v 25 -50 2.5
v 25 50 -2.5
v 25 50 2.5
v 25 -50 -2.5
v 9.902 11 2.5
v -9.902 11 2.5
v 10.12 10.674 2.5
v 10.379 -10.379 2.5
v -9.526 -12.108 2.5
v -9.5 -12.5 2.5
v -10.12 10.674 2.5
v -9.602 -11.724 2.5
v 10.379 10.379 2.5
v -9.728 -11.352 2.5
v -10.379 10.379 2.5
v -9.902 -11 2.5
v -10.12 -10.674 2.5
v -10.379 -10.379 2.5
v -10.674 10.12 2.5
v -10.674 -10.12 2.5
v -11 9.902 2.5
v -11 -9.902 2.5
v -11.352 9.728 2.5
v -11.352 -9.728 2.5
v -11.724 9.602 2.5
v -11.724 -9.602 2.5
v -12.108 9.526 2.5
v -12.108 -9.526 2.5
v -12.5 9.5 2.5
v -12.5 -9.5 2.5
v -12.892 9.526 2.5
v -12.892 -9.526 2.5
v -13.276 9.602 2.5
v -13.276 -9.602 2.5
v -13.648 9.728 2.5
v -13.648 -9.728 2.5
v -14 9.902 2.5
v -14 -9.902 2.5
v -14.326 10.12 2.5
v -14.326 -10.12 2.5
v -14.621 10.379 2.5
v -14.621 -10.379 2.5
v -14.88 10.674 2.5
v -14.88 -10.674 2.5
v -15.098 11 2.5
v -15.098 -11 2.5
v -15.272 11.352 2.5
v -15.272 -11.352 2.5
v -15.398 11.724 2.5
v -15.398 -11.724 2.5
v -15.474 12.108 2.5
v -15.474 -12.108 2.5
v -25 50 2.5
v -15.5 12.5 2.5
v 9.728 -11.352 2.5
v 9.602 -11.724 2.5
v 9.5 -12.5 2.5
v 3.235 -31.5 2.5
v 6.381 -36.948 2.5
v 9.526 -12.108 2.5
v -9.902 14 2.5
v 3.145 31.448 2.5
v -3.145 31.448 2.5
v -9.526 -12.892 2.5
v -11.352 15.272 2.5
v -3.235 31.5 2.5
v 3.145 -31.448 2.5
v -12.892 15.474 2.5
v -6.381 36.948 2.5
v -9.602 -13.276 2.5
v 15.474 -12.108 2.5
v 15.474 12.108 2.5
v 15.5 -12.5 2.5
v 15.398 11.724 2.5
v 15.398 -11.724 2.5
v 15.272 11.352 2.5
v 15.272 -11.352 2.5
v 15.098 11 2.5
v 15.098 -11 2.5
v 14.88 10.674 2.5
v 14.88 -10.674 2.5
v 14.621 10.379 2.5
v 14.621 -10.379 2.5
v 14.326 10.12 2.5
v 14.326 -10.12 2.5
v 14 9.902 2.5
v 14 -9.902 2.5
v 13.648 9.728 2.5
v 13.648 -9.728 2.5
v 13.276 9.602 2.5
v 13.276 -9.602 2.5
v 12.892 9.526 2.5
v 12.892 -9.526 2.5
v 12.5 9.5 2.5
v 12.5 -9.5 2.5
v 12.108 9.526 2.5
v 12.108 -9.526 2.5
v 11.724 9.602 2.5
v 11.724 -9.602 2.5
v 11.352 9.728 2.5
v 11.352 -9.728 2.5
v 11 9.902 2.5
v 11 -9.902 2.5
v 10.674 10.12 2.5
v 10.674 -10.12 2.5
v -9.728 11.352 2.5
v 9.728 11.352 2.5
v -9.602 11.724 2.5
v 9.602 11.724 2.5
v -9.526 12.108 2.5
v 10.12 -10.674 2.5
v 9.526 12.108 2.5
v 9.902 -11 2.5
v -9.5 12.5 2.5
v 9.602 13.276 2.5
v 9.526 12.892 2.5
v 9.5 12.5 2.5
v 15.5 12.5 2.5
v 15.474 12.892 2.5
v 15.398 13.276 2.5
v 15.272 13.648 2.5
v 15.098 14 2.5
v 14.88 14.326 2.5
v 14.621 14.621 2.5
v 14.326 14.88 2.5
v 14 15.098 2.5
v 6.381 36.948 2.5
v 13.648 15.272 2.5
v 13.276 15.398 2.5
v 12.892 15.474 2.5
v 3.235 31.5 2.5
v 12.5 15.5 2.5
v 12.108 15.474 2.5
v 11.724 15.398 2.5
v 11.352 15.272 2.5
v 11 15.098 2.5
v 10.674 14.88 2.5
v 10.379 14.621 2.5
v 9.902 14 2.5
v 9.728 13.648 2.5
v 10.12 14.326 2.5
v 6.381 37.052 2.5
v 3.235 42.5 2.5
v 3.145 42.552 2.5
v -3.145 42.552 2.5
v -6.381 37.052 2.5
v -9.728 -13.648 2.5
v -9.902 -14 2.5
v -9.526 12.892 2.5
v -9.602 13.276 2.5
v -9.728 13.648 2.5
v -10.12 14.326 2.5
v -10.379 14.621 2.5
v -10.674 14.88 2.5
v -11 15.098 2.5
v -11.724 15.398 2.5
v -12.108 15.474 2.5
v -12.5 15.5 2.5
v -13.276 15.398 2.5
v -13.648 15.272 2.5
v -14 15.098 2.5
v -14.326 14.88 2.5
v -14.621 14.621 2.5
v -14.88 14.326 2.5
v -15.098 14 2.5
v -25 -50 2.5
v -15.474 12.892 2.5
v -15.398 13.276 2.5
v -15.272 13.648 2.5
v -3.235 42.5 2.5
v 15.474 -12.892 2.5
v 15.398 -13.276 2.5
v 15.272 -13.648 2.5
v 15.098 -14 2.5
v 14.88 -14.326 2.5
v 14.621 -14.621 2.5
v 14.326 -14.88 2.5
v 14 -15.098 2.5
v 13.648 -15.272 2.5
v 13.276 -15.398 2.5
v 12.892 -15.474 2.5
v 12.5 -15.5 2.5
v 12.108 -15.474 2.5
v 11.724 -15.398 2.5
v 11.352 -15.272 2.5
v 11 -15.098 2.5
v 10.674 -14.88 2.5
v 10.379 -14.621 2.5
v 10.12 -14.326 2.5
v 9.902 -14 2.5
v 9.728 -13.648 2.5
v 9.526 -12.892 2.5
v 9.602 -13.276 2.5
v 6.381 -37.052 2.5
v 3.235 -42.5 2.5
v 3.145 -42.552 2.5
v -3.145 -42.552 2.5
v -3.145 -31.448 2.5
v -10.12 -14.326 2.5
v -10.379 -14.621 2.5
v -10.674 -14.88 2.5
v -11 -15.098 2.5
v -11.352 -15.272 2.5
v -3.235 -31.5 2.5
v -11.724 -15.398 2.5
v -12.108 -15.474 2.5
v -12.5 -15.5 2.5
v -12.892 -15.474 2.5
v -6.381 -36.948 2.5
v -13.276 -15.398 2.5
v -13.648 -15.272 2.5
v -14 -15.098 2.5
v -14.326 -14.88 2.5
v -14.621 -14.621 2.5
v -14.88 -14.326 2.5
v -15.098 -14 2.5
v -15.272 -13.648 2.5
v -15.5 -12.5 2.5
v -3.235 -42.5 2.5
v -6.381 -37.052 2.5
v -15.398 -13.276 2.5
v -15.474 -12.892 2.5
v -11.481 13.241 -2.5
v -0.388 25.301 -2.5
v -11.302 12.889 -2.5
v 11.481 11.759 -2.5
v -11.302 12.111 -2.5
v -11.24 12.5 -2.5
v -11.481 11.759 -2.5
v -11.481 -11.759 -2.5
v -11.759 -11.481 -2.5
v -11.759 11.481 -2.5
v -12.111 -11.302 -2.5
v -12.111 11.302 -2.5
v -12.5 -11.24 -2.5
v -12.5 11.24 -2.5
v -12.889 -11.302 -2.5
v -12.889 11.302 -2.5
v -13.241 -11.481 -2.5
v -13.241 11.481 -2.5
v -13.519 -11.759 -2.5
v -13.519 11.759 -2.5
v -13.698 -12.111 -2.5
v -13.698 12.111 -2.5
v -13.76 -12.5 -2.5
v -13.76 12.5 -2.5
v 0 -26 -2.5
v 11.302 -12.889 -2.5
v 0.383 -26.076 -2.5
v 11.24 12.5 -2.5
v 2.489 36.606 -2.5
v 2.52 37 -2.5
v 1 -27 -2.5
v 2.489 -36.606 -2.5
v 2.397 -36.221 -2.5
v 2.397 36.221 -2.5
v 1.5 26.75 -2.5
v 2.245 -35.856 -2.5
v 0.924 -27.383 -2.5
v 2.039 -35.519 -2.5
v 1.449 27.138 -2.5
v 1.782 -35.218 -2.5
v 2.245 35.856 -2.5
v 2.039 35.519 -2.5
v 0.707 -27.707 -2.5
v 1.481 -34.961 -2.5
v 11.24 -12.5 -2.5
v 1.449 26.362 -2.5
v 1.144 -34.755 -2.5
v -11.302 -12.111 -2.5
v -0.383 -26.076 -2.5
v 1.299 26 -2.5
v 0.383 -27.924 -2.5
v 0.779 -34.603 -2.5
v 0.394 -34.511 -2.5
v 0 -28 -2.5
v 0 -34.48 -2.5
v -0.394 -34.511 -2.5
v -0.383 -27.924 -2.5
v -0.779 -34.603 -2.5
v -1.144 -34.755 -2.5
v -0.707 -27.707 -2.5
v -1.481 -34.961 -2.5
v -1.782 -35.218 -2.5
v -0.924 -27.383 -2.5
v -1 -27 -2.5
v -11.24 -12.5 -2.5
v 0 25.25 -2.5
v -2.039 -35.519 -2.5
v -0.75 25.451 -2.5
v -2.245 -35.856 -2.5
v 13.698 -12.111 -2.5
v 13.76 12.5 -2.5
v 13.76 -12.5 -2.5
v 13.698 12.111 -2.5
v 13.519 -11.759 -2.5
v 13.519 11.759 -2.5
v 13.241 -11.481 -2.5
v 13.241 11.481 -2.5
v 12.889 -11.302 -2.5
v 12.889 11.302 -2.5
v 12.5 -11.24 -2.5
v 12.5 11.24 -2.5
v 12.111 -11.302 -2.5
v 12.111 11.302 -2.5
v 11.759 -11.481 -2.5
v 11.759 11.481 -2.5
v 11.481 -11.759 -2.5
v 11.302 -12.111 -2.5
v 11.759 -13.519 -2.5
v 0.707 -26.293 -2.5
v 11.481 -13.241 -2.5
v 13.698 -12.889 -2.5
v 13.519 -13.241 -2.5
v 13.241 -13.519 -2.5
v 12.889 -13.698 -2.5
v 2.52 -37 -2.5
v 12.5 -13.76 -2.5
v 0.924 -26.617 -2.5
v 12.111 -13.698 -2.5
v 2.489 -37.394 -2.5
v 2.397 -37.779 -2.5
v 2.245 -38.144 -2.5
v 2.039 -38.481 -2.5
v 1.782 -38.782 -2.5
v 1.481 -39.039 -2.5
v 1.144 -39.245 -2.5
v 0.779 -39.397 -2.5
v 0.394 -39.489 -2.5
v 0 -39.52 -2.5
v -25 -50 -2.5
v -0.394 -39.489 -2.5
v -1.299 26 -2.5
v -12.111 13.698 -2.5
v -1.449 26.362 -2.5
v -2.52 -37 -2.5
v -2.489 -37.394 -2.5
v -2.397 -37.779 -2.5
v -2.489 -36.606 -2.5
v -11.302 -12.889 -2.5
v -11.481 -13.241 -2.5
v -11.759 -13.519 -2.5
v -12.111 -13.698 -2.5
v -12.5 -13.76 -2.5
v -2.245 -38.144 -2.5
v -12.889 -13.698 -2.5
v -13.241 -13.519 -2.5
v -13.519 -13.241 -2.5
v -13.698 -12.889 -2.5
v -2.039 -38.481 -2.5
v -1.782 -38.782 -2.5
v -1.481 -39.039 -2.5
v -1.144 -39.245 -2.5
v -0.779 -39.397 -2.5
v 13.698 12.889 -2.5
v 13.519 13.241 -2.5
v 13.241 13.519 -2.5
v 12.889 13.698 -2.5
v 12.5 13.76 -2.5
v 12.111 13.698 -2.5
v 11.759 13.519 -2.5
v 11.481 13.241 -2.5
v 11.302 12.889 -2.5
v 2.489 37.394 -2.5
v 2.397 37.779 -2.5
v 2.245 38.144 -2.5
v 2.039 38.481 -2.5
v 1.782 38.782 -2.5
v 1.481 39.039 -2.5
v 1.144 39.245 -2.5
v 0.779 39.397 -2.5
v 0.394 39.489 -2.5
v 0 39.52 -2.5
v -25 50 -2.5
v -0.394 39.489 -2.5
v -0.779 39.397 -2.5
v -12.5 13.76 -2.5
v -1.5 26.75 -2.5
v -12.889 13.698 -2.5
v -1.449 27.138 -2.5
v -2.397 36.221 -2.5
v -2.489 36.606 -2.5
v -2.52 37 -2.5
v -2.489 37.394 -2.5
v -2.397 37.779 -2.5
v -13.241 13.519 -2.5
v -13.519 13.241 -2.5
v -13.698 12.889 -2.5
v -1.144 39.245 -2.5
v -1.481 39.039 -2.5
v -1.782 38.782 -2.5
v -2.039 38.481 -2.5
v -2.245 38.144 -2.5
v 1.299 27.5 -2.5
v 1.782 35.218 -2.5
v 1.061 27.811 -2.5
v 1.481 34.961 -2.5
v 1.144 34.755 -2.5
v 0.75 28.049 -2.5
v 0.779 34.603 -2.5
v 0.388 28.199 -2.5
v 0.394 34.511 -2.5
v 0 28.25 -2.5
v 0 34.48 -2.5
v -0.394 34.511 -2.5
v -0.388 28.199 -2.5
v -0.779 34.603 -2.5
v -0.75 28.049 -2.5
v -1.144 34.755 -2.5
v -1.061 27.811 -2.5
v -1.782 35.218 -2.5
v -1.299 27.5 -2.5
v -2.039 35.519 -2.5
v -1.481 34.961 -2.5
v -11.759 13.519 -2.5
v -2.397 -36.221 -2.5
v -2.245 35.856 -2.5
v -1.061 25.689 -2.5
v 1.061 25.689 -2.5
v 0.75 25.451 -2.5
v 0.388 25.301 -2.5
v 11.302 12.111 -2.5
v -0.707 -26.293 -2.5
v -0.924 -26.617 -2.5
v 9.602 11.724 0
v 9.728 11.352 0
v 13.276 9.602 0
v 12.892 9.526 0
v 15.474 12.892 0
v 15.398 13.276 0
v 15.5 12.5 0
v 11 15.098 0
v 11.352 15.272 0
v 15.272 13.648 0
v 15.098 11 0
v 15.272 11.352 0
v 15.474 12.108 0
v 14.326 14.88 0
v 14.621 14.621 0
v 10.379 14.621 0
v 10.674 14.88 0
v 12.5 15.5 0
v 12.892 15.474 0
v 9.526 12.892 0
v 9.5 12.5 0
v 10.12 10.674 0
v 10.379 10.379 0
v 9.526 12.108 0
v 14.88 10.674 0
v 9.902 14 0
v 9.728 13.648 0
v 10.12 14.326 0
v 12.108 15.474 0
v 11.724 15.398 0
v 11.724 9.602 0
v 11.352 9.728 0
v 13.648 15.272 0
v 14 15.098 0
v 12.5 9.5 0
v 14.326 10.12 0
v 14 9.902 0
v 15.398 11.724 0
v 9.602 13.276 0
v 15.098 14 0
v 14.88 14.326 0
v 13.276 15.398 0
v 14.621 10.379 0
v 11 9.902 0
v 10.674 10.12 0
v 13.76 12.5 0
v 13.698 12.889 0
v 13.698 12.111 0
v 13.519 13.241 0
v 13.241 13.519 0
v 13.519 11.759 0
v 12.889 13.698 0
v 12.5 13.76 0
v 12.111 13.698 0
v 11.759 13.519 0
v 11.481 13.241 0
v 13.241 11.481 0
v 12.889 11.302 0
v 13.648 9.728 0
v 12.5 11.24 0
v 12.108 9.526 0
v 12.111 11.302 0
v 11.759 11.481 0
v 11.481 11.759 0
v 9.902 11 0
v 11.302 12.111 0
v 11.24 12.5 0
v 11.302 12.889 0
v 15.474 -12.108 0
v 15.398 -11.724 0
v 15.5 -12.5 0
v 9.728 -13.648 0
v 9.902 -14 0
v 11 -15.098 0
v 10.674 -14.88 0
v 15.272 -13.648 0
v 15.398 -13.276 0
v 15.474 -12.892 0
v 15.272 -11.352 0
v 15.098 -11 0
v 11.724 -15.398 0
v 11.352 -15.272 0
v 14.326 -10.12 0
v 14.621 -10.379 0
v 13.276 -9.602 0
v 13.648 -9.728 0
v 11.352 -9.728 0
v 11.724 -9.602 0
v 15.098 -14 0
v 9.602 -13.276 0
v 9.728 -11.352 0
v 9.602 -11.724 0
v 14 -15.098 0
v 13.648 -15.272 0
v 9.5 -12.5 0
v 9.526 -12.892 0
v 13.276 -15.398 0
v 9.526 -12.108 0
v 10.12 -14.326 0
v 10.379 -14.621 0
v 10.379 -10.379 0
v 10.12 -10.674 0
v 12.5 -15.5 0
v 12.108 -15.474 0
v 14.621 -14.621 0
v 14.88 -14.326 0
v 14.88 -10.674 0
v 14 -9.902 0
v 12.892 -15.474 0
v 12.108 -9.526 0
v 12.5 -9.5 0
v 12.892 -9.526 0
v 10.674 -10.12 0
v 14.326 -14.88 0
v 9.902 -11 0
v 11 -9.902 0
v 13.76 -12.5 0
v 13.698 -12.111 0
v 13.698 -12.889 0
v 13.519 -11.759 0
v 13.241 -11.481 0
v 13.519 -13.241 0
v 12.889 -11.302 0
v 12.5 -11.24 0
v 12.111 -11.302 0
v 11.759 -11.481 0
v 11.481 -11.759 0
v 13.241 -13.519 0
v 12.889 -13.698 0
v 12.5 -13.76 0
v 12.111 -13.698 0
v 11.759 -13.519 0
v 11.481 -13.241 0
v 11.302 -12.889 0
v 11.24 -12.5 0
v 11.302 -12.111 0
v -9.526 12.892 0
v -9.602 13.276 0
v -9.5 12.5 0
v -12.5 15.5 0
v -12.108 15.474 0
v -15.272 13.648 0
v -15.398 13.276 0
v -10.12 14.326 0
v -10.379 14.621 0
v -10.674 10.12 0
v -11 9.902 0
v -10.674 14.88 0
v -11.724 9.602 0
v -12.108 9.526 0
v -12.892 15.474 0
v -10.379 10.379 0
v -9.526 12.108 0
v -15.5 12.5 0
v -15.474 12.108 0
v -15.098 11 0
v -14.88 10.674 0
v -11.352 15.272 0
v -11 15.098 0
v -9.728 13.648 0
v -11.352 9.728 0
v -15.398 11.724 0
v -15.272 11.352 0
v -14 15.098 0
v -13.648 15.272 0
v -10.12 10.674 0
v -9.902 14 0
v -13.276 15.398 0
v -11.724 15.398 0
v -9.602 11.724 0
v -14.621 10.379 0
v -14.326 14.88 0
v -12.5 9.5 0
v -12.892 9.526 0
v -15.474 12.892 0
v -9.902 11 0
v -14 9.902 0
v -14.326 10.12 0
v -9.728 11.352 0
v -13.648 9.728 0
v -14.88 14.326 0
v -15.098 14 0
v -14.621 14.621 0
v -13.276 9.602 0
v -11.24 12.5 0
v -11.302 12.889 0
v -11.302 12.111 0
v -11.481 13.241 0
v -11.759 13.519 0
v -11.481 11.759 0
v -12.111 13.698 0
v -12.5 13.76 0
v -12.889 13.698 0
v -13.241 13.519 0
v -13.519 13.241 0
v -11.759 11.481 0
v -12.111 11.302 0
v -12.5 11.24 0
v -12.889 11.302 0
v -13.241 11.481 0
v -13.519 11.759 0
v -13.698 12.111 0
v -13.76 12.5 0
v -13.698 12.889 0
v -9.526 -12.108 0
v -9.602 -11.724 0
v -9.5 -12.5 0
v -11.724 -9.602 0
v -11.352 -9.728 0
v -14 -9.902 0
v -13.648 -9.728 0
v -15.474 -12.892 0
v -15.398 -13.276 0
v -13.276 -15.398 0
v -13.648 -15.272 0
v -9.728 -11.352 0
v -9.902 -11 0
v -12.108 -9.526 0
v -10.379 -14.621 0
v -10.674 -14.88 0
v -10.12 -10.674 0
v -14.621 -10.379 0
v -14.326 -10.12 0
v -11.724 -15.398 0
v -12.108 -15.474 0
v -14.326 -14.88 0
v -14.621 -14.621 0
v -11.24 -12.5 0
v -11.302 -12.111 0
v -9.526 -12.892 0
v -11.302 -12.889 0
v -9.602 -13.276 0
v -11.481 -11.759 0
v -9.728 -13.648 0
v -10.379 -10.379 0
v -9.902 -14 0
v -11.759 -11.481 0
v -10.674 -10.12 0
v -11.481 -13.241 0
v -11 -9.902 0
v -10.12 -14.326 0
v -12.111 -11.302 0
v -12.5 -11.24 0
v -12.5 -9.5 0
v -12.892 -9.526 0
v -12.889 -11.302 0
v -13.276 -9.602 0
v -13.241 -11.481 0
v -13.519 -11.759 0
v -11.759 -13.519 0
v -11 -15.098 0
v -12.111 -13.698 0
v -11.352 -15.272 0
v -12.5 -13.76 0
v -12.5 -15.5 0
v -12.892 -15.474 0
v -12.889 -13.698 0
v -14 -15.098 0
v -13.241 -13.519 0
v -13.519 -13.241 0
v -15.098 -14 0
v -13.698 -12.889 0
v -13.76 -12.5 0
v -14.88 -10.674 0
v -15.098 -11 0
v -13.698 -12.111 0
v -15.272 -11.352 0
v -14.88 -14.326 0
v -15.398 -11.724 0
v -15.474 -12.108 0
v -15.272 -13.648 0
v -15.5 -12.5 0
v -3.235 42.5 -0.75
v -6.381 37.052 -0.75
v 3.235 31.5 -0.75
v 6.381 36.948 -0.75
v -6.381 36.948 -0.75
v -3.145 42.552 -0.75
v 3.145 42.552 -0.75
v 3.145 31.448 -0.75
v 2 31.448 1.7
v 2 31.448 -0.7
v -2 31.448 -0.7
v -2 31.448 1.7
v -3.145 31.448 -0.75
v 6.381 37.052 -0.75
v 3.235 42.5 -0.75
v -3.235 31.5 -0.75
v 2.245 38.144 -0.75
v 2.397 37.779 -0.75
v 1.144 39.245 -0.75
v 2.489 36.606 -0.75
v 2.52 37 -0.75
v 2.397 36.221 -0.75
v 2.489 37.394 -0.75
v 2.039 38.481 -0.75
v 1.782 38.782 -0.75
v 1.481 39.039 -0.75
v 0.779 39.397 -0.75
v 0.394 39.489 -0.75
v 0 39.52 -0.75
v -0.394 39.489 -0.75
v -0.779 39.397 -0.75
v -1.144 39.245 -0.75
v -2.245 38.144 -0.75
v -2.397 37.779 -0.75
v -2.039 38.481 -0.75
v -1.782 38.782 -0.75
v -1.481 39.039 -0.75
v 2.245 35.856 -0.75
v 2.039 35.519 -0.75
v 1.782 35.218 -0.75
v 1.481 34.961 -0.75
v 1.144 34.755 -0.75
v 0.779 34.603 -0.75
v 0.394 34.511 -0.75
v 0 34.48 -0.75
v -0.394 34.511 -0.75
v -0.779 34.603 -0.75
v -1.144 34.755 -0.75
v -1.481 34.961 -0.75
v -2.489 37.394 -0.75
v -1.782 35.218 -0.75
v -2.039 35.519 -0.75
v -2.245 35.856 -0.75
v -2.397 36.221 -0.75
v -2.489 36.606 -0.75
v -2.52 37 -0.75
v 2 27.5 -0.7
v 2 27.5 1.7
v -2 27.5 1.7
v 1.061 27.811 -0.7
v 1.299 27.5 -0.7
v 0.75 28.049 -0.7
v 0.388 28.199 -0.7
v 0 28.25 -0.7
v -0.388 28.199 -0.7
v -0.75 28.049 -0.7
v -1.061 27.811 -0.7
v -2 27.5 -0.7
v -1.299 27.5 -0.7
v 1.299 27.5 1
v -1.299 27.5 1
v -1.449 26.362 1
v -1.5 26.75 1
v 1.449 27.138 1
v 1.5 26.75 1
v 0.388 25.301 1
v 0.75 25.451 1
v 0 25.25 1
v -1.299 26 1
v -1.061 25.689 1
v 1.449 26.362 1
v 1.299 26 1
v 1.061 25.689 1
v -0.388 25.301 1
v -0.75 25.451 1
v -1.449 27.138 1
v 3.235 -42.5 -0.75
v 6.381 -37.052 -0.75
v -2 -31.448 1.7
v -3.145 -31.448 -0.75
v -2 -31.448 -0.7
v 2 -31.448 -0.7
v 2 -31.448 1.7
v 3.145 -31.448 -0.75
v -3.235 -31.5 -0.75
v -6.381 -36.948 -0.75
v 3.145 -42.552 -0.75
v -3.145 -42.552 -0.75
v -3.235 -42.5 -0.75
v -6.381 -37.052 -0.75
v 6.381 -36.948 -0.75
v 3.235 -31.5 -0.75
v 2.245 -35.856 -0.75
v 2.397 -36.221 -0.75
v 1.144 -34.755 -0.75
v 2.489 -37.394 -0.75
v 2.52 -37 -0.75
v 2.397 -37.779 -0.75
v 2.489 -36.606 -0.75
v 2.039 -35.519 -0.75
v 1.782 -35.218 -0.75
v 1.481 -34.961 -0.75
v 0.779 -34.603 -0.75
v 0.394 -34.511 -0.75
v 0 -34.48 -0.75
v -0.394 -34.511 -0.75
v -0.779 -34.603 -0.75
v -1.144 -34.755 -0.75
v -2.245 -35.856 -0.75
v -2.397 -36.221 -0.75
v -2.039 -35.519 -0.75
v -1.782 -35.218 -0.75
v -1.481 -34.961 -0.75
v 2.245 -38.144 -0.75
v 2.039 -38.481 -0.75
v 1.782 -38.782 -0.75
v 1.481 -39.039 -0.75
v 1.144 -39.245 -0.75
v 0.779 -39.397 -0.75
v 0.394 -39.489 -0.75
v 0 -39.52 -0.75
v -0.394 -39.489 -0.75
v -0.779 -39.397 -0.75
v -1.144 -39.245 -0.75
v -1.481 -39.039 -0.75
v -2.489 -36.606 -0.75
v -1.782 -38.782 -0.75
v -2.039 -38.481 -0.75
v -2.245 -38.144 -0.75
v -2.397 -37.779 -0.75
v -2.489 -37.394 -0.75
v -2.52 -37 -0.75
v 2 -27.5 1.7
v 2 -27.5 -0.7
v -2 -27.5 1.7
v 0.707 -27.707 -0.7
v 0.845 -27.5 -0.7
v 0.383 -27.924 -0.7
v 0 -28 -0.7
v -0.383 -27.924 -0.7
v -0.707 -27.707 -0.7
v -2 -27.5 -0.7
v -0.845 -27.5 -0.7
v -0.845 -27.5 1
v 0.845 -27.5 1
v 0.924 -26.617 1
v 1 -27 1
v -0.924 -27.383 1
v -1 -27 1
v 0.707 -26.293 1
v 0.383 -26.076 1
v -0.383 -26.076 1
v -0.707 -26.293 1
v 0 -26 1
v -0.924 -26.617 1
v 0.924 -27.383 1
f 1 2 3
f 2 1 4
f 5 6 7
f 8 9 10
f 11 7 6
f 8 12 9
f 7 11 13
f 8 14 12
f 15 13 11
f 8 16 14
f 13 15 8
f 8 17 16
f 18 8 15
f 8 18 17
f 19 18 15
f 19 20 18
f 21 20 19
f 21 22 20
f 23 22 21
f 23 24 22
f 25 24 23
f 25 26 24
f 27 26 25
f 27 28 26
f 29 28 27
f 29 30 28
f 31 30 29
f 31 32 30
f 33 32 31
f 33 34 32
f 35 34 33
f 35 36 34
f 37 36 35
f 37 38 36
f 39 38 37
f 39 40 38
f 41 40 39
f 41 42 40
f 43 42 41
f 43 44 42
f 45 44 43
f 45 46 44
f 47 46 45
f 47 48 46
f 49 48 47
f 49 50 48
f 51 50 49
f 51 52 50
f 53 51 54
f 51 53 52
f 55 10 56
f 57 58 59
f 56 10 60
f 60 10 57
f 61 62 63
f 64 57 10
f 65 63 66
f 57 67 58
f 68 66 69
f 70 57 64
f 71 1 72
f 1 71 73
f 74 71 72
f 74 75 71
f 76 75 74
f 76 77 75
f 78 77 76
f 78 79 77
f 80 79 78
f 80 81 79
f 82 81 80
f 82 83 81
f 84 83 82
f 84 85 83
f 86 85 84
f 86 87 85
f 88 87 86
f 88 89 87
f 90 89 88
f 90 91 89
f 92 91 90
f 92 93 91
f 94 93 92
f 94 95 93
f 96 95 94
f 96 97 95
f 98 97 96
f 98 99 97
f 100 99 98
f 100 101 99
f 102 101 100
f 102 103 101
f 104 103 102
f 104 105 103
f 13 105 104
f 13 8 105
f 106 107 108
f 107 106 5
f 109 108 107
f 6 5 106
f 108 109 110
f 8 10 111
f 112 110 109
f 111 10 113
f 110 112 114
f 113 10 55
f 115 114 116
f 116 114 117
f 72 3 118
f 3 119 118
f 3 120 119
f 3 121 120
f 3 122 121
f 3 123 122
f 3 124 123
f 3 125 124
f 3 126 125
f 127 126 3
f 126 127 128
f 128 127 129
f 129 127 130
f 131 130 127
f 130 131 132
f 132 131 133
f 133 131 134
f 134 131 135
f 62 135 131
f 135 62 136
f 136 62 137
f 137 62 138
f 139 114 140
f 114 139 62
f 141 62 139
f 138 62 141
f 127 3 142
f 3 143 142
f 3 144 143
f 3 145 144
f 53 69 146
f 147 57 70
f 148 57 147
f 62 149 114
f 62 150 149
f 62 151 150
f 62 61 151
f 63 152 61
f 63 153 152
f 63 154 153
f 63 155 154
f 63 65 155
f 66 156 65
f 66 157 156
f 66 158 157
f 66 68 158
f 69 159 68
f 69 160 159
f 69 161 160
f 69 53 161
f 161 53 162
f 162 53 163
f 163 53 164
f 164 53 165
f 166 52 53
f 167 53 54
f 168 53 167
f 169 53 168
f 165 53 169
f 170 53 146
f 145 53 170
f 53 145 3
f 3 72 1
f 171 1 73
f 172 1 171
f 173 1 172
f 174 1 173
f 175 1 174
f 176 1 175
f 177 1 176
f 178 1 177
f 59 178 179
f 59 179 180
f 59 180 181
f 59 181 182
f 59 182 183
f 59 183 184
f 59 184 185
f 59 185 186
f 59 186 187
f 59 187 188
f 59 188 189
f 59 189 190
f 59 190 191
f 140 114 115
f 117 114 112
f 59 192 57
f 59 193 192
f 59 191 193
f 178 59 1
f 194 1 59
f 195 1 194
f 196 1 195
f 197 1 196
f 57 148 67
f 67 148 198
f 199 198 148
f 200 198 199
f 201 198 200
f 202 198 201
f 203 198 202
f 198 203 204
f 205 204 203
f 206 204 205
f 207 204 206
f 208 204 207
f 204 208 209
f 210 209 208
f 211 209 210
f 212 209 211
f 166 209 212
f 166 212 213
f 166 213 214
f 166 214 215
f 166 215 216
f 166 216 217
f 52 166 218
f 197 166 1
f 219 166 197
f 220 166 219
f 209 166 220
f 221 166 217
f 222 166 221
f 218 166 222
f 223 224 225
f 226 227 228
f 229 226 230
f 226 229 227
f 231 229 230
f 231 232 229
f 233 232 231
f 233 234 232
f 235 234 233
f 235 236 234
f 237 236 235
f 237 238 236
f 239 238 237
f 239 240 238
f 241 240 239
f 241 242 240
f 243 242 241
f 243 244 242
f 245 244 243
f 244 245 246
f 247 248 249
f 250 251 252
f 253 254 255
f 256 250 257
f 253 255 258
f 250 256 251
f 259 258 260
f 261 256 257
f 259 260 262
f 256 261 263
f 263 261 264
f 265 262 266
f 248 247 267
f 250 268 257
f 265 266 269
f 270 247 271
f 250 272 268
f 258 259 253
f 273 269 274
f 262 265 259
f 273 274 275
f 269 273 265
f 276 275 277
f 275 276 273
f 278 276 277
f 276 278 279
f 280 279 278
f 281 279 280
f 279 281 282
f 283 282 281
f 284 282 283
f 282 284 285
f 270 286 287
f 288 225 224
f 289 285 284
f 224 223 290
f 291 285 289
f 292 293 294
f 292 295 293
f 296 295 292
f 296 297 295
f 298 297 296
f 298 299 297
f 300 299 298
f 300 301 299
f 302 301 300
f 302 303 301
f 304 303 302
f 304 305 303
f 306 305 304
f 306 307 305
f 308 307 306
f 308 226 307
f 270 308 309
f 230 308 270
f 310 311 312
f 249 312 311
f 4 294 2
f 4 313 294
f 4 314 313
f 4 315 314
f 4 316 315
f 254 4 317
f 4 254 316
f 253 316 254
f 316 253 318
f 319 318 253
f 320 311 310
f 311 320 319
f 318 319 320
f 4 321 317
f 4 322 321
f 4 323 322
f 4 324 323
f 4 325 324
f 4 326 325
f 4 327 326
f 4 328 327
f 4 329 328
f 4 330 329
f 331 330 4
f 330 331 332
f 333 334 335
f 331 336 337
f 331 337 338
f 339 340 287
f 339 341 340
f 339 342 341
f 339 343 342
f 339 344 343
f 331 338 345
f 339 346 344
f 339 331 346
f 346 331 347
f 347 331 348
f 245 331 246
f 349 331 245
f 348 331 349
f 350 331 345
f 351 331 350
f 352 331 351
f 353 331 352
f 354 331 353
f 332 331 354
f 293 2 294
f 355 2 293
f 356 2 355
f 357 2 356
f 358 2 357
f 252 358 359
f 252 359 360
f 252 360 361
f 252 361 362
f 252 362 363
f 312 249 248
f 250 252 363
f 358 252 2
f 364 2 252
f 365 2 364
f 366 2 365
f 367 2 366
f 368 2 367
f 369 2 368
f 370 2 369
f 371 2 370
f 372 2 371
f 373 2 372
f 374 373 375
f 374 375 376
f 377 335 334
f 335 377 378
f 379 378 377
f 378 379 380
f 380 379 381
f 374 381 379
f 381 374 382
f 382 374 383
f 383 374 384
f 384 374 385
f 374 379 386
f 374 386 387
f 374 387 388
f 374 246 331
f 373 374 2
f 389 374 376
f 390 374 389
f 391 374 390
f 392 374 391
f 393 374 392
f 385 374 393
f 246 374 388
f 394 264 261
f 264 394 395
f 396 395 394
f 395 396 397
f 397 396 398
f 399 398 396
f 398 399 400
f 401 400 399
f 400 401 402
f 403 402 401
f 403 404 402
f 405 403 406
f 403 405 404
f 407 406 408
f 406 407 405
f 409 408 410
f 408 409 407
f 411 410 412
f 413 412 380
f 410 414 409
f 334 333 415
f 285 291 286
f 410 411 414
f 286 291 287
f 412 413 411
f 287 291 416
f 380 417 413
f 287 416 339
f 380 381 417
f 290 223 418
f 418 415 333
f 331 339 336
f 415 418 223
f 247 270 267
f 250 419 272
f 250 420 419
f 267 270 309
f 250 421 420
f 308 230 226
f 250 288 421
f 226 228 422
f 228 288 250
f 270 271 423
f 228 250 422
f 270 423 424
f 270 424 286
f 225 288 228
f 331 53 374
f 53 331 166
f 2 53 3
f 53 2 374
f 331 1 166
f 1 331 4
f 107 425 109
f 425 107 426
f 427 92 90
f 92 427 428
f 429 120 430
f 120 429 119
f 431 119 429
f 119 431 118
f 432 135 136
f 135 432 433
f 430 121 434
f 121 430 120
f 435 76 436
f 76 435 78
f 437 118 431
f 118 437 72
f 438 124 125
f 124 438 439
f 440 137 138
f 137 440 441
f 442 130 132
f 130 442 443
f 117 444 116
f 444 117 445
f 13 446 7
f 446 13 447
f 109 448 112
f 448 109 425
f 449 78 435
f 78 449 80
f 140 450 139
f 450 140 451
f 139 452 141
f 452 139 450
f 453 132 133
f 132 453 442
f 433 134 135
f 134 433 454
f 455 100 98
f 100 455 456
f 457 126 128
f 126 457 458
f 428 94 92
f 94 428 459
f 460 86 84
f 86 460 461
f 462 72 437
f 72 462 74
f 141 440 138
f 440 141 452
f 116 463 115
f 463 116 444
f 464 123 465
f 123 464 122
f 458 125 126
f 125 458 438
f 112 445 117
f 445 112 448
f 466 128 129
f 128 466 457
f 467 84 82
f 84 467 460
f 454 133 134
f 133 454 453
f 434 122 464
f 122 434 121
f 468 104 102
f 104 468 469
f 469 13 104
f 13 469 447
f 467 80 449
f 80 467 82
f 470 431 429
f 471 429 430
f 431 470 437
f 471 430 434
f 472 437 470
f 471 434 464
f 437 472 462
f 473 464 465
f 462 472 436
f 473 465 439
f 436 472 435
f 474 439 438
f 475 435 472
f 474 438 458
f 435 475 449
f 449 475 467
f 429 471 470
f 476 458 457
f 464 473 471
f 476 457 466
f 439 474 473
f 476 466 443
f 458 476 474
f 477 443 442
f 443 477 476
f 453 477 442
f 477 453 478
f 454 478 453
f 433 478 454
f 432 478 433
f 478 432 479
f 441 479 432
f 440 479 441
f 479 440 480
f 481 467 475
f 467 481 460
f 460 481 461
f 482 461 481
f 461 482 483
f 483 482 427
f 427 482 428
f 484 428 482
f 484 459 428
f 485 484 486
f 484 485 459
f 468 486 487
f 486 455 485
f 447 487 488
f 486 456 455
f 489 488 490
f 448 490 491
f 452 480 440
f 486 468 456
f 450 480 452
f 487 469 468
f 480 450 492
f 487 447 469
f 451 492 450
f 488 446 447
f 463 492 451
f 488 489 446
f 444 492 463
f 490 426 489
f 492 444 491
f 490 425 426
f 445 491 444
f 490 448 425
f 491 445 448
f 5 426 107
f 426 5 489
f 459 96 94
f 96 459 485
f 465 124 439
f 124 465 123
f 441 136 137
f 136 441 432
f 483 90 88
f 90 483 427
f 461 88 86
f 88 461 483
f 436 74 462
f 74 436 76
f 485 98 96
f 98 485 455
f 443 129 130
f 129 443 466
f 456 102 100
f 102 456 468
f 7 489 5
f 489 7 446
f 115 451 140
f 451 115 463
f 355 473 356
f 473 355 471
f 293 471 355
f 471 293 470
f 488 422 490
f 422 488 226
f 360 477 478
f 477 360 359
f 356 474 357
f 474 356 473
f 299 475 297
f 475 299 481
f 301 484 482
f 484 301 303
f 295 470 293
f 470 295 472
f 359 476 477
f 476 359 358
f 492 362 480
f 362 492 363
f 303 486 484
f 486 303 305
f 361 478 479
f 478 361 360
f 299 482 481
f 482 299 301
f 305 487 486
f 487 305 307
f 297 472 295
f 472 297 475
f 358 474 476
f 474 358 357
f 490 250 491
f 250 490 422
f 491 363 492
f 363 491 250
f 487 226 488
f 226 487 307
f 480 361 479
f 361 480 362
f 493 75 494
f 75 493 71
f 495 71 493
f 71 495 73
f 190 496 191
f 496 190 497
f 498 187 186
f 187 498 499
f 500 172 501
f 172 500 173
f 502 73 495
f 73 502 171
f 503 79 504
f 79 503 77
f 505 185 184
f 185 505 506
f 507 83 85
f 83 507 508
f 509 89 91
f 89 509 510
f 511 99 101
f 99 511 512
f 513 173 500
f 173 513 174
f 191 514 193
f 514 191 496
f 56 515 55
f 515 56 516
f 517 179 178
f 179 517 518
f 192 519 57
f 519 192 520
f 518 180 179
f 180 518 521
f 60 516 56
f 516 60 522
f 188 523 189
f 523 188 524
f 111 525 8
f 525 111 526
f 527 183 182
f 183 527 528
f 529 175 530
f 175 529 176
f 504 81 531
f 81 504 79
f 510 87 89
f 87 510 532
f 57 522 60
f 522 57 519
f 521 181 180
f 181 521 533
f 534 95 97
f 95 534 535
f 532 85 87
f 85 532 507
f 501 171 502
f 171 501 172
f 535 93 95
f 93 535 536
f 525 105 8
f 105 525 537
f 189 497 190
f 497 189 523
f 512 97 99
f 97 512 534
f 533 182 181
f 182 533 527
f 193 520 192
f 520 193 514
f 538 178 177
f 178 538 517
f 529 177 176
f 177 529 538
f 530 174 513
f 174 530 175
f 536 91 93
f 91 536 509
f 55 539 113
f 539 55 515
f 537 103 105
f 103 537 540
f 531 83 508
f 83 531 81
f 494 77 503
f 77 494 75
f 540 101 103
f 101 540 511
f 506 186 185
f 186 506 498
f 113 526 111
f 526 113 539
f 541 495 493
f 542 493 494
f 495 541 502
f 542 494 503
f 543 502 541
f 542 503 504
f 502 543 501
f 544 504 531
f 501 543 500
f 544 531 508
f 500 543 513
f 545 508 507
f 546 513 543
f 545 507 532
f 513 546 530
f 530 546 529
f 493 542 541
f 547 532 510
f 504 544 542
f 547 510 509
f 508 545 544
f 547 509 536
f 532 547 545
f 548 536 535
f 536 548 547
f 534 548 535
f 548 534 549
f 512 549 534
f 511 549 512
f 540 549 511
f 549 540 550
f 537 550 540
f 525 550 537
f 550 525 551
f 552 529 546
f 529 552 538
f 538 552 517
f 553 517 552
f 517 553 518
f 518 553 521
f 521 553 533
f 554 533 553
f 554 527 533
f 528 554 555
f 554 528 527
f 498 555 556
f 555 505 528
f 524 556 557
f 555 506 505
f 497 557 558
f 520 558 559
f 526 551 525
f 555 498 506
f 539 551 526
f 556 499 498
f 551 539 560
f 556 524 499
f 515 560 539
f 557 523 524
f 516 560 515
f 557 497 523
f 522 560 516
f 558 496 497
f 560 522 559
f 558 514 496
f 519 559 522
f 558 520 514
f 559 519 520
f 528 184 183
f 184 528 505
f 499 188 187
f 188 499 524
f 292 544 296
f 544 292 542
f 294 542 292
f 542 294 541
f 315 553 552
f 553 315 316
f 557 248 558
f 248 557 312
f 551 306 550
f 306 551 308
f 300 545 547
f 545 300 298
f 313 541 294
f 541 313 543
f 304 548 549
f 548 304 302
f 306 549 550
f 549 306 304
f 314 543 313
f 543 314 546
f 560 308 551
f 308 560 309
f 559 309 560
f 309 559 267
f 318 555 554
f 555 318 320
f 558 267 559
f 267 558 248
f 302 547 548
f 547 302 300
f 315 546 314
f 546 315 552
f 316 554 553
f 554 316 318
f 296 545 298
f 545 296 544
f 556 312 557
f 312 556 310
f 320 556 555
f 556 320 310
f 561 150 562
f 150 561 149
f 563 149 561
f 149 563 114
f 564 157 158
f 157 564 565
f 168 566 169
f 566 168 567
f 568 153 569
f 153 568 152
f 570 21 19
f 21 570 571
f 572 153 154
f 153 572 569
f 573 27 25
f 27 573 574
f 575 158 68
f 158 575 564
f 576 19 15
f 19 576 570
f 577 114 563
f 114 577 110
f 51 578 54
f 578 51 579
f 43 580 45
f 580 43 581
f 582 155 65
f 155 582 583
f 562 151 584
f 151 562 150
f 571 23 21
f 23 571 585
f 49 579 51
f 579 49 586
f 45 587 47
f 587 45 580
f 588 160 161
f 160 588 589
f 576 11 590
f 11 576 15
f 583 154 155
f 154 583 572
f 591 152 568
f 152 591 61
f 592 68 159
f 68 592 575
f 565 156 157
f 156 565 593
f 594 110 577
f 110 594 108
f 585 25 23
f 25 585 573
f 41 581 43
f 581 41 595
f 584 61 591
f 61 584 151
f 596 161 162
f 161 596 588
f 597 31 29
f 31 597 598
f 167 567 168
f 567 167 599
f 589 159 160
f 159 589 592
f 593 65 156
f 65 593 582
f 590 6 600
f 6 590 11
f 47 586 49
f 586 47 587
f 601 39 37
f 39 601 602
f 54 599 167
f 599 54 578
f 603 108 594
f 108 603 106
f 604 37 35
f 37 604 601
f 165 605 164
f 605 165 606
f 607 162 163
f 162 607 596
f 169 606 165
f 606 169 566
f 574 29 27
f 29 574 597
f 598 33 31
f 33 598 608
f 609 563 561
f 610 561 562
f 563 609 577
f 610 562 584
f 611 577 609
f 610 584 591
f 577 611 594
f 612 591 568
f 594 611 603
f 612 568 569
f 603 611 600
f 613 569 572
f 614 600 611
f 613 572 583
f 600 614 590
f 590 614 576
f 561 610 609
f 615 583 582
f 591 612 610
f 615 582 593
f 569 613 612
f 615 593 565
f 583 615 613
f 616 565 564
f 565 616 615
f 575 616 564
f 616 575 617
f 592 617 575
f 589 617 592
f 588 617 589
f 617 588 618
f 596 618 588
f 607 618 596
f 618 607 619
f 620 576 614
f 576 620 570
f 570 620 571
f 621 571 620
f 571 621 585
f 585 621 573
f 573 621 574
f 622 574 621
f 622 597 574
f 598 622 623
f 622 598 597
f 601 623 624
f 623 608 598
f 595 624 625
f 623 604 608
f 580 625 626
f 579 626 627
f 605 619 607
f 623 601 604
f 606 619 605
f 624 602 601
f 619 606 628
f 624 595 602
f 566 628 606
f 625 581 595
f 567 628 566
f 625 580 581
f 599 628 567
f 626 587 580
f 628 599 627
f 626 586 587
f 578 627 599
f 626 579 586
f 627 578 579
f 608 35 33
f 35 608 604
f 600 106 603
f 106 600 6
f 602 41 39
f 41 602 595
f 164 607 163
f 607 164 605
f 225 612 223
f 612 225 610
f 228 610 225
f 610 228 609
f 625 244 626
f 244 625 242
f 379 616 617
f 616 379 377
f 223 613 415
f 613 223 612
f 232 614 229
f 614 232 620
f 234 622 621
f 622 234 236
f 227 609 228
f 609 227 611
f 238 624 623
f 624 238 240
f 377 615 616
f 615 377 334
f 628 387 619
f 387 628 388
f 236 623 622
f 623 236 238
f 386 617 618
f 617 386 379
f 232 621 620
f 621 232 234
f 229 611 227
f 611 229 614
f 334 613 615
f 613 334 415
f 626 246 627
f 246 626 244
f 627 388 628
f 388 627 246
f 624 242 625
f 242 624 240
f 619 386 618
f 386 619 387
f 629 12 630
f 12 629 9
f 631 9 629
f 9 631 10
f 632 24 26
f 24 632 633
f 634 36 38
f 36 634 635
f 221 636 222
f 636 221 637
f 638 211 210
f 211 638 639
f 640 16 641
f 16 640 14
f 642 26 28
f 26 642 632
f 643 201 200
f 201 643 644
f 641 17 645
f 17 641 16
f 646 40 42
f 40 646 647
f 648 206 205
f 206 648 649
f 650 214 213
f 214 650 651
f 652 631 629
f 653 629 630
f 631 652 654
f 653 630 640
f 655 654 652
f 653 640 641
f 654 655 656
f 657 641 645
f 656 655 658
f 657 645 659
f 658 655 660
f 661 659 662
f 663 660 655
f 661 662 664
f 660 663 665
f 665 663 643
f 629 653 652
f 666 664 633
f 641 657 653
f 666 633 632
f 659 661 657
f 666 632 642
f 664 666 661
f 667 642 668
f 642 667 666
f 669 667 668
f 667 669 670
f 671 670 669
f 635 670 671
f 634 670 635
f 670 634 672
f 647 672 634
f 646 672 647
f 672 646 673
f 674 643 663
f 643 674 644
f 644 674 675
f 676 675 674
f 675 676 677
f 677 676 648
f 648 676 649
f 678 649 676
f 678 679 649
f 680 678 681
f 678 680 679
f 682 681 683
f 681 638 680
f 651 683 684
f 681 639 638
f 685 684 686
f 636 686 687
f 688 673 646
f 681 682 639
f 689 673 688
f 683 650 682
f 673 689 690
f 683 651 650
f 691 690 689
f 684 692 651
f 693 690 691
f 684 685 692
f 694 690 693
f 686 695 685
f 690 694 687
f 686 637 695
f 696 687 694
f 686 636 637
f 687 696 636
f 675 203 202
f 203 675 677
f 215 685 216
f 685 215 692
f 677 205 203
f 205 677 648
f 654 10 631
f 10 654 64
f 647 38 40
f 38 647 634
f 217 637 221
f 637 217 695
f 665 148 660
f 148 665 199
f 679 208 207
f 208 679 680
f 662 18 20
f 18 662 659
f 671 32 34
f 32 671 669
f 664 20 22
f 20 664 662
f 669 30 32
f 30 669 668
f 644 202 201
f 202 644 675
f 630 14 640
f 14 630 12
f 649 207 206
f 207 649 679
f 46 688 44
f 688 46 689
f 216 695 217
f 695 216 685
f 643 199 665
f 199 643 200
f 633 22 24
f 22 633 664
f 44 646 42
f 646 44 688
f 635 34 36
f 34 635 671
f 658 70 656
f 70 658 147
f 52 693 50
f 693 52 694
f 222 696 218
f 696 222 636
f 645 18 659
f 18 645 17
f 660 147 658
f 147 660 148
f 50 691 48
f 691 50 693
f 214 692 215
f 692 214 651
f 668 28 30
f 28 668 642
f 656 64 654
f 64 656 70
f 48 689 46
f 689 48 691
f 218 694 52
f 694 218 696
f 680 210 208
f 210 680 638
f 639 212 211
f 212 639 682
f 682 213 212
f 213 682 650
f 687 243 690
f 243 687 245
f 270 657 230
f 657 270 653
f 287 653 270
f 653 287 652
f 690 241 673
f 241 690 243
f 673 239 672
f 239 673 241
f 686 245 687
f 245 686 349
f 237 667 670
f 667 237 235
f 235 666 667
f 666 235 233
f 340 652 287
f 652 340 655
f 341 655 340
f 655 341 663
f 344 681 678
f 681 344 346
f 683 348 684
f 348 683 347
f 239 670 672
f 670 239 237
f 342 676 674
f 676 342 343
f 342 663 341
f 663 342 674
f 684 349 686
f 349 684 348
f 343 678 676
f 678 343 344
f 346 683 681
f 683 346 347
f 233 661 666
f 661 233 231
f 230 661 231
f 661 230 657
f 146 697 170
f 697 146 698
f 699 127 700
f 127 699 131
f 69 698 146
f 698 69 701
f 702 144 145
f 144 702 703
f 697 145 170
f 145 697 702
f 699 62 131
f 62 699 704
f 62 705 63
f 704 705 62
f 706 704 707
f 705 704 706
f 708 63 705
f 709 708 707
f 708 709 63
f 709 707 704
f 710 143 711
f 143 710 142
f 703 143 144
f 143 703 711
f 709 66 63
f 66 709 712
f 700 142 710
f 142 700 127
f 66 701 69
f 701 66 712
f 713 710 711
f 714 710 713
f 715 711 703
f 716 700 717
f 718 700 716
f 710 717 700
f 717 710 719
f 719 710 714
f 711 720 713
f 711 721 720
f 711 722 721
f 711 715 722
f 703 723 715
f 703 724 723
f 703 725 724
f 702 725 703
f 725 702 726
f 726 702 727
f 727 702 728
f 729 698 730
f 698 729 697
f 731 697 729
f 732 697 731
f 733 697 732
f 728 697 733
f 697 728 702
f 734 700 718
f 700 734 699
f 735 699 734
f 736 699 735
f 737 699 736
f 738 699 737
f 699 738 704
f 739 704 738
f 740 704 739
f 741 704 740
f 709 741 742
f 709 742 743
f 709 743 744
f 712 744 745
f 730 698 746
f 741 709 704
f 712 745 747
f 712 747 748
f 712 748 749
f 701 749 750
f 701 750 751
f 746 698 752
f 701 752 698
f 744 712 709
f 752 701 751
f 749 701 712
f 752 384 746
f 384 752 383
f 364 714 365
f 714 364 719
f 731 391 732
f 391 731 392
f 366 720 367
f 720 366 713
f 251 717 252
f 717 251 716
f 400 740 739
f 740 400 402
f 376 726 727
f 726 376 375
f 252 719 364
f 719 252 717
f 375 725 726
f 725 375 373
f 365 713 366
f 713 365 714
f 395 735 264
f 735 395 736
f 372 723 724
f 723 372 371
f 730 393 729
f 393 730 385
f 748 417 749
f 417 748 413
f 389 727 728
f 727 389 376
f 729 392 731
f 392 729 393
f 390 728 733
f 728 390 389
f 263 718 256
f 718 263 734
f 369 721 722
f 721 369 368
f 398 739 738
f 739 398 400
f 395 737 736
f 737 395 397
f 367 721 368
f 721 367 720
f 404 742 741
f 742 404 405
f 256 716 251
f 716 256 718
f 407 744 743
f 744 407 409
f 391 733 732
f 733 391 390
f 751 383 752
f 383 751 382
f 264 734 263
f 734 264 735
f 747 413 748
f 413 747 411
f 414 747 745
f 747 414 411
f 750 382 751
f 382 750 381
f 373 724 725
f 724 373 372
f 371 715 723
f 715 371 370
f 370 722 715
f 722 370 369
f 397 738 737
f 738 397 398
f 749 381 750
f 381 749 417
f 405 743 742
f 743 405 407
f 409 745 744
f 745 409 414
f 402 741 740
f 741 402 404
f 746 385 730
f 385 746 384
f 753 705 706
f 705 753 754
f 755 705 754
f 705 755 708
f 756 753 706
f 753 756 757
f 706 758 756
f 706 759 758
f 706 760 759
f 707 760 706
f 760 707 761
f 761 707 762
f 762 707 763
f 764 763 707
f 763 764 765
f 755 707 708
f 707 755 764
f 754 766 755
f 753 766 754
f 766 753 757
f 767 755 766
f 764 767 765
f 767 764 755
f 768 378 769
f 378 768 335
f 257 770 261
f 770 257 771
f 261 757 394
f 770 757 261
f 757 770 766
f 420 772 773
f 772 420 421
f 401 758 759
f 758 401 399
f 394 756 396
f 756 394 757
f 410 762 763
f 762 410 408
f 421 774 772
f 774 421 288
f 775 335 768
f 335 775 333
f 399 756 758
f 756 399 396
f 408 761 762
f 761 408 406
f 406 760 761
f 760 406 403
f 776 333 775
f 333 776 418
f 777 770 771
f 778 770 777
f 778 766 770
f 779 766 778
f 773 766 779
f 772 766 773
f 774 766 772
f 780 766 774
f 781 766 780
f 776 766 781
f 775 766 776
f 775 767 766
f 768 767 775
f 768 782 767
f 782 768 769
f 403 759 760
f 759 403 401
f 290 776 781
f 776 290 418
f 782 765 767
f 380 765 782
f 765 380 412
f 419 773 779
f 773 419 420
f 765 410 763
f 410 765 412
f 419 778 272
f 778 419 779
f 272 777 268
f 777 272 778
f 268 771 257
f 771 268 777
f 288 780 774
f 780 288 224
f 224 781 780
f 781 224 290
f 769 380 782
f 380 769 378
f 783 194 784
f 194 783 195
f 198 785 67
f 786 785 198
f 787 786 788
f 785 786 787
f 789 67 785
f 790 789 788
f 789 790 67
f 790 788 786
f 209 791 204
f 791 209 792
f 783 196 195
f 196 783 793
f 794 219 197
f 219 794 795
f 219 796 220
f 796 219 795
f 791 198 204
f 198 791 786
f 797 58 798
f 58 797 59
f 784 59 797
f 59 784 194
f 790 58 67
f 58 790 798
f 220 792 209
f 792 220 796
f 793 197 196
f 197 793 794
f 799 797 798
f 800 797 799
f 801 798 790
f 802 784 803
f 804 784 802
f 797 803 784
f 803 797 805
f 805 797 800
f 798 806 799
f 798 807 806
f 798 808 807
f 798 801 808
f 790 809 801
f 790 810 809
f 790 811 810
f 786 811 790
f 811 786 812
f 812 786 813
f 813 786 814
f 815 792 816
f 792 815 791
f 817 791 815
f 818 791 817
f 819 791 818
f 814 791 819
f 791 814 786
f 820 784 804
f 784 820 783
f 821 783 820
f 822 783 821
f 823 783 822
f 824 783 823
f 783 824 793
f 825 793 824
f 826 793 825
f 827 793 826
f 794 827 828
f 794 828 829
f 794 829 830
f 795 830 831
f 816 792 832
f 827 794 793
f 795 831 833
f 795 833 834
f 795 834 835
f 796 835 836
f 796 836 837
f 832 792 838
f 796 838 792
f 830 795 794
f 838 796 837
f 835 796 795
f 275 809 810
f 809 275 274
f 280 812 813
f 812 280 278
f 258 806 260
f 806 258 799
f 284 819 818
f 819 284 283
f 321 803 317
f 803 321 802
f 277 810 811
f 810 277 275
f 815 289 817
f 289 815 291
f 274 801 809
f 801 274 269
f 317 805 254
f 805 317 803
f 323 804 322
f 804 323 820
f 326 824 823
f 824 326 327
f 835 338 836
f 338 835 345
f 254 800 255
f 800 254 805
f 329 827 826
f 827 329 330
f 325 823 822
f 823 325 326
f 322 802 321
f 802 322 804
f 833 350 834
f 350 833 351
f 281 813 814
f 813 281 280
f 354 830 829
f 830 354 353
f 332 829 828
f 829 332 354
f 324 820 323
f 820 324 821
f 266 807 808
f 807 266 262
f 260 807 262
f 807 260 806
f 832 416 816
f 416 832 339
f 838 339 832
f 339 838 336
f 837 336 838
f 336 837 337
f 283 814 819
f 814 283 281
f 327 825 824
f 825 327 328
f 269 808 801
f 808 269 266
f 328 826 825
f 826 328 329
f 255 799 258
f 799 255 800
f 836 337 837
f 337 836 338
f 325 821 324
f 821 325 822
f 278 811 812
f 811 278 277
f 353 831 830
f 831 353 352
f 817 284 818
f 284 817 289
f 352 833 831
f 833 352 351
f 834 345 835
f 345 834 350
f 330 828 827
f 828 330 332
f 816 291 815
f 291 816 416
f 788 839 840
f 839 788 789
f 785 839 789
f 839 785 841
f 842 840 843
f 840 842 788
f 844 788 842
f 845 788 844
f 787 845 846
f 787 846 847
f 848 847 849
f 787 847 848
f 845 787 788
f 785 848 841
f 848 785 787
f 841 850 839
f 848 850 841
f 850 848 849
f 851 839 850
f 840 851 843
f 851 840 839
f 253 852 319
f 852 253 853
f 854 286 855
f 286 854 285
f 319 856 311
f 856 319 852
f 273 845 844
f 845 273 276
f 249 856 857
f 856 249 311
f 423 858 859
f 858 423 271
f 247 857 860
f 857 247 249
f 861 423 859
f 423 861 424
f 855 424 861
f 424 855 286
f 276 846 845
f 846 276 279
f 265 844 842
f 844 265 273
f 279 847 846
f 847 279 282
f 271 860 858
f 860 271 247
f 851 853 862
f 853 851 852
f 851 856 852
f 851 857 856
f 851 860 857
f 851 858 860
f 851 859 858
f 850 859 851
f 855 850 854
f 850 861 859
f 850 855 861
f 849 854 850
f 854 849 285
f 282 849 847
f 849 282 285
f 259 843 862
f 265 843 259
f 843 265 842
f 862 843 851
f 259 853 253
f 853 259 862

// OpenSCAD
$fa = 1;
$fs = 0.4;

module phex(wid,rad,height){
hull(){
translate([wid/2-rad,0,0])cylinder(r=rad,h=height);
rotate([0,0,60])translate([wid/2-rad,0,0])cylinder(r=rad,h=height);
rotate([0,0,120])translate([wid/2-rad,0,0])cylinder(r=rad,h=height);
rotate([0,0,180])translate([wid/2-rad,0,0])cylinder(r=rad,h=height);
rotate([0,0,240])translate([wid/2-rad,0,0])cylinder(r=rad,h=height);
rotate([0,0,300])translate([wid/2-rad,0,0])cylinder(r=rad,h=height);

}
}

module fhex(wid,height){
hull(){
cube([wid/1.7,wid,height],center = true);
rotate([0,0,120])cube([wid/1.7,wid,height],center = true);
rotate([0,0,240])cube([wid/1.7,wid,height],center = true);
}
}




difference(){
cube([50
,100,5],center=true);

translate([12.5,12.5,(2.24+0.5)/2])
cylinder(h=2.24+0.5+0.001,r=6/2,center=true);

translate([12.5,12.5,0])
cylinder(h=5.5+0.001,r=2.52/2,center=true);

translate([12.5,-12.5,(2.24+0.5)/2])
cylinder(h=2.24+0.5+0.001,r=6/2,center=true);
translate([12.5,-12.5,0])
cylinder(h=5+0.5+0.001,r=2.52/2,center=true);

translate([-12.5,12.5,(2.24+0.5)/2])
cylinder(h=2.24+0.5+0.001,r=6/2,center=true);
translate([-12.5,12.5,0])
cylinder(h=5+0.5+0.001,r=2.52/2,center=true);
    
translate([-12.5,-12.5,(2.24+0.5)/2])
cylinder(h=2.24+0.5+0.001,r=6/2,center=true);
translate([-12.5,-12.5,0])
cylinder(h=5+0.001,r=2.52/2,center=true);

//hexagono superior 
translate([0,37,1.2])
fhex(11,4-0.1);

//hueco para bulon concentrico a hexagono
translate([0,37,1.5])
cylinder(h=8+0.001,r=5.04/2,center=true);

//hueco rectangular 37mm-5(ancho de hexagono)-largo/2 de hueco
translate([0,32-4/2,1/2])
color([1,0,1])cube([4
,5,2.4],center=true);


// Cilindro al final del hueco 32-Ltotal-radio/2
translate([0,32-4.5-1.5/2,-1])
cylinder(h=4+0.001,r=1.5,center=true);

//hexagono inferior

translate([0,-37,1.2])
fhex(11,4-0.1);

translate([0,-37,1.5])
cylinder(h=8+0.001,r=5.04/2,center=true); 

translate([0,-32+4/2,1/2])
color([1,0,0])cube([4
,5,2.4],center=true);

translate([0,-32+4.5+1/2,-1])
cylinder(h=4+0.001,r=1,center=true);

}

//color([100,0,1])cube([300,300,4-1], center=true);
